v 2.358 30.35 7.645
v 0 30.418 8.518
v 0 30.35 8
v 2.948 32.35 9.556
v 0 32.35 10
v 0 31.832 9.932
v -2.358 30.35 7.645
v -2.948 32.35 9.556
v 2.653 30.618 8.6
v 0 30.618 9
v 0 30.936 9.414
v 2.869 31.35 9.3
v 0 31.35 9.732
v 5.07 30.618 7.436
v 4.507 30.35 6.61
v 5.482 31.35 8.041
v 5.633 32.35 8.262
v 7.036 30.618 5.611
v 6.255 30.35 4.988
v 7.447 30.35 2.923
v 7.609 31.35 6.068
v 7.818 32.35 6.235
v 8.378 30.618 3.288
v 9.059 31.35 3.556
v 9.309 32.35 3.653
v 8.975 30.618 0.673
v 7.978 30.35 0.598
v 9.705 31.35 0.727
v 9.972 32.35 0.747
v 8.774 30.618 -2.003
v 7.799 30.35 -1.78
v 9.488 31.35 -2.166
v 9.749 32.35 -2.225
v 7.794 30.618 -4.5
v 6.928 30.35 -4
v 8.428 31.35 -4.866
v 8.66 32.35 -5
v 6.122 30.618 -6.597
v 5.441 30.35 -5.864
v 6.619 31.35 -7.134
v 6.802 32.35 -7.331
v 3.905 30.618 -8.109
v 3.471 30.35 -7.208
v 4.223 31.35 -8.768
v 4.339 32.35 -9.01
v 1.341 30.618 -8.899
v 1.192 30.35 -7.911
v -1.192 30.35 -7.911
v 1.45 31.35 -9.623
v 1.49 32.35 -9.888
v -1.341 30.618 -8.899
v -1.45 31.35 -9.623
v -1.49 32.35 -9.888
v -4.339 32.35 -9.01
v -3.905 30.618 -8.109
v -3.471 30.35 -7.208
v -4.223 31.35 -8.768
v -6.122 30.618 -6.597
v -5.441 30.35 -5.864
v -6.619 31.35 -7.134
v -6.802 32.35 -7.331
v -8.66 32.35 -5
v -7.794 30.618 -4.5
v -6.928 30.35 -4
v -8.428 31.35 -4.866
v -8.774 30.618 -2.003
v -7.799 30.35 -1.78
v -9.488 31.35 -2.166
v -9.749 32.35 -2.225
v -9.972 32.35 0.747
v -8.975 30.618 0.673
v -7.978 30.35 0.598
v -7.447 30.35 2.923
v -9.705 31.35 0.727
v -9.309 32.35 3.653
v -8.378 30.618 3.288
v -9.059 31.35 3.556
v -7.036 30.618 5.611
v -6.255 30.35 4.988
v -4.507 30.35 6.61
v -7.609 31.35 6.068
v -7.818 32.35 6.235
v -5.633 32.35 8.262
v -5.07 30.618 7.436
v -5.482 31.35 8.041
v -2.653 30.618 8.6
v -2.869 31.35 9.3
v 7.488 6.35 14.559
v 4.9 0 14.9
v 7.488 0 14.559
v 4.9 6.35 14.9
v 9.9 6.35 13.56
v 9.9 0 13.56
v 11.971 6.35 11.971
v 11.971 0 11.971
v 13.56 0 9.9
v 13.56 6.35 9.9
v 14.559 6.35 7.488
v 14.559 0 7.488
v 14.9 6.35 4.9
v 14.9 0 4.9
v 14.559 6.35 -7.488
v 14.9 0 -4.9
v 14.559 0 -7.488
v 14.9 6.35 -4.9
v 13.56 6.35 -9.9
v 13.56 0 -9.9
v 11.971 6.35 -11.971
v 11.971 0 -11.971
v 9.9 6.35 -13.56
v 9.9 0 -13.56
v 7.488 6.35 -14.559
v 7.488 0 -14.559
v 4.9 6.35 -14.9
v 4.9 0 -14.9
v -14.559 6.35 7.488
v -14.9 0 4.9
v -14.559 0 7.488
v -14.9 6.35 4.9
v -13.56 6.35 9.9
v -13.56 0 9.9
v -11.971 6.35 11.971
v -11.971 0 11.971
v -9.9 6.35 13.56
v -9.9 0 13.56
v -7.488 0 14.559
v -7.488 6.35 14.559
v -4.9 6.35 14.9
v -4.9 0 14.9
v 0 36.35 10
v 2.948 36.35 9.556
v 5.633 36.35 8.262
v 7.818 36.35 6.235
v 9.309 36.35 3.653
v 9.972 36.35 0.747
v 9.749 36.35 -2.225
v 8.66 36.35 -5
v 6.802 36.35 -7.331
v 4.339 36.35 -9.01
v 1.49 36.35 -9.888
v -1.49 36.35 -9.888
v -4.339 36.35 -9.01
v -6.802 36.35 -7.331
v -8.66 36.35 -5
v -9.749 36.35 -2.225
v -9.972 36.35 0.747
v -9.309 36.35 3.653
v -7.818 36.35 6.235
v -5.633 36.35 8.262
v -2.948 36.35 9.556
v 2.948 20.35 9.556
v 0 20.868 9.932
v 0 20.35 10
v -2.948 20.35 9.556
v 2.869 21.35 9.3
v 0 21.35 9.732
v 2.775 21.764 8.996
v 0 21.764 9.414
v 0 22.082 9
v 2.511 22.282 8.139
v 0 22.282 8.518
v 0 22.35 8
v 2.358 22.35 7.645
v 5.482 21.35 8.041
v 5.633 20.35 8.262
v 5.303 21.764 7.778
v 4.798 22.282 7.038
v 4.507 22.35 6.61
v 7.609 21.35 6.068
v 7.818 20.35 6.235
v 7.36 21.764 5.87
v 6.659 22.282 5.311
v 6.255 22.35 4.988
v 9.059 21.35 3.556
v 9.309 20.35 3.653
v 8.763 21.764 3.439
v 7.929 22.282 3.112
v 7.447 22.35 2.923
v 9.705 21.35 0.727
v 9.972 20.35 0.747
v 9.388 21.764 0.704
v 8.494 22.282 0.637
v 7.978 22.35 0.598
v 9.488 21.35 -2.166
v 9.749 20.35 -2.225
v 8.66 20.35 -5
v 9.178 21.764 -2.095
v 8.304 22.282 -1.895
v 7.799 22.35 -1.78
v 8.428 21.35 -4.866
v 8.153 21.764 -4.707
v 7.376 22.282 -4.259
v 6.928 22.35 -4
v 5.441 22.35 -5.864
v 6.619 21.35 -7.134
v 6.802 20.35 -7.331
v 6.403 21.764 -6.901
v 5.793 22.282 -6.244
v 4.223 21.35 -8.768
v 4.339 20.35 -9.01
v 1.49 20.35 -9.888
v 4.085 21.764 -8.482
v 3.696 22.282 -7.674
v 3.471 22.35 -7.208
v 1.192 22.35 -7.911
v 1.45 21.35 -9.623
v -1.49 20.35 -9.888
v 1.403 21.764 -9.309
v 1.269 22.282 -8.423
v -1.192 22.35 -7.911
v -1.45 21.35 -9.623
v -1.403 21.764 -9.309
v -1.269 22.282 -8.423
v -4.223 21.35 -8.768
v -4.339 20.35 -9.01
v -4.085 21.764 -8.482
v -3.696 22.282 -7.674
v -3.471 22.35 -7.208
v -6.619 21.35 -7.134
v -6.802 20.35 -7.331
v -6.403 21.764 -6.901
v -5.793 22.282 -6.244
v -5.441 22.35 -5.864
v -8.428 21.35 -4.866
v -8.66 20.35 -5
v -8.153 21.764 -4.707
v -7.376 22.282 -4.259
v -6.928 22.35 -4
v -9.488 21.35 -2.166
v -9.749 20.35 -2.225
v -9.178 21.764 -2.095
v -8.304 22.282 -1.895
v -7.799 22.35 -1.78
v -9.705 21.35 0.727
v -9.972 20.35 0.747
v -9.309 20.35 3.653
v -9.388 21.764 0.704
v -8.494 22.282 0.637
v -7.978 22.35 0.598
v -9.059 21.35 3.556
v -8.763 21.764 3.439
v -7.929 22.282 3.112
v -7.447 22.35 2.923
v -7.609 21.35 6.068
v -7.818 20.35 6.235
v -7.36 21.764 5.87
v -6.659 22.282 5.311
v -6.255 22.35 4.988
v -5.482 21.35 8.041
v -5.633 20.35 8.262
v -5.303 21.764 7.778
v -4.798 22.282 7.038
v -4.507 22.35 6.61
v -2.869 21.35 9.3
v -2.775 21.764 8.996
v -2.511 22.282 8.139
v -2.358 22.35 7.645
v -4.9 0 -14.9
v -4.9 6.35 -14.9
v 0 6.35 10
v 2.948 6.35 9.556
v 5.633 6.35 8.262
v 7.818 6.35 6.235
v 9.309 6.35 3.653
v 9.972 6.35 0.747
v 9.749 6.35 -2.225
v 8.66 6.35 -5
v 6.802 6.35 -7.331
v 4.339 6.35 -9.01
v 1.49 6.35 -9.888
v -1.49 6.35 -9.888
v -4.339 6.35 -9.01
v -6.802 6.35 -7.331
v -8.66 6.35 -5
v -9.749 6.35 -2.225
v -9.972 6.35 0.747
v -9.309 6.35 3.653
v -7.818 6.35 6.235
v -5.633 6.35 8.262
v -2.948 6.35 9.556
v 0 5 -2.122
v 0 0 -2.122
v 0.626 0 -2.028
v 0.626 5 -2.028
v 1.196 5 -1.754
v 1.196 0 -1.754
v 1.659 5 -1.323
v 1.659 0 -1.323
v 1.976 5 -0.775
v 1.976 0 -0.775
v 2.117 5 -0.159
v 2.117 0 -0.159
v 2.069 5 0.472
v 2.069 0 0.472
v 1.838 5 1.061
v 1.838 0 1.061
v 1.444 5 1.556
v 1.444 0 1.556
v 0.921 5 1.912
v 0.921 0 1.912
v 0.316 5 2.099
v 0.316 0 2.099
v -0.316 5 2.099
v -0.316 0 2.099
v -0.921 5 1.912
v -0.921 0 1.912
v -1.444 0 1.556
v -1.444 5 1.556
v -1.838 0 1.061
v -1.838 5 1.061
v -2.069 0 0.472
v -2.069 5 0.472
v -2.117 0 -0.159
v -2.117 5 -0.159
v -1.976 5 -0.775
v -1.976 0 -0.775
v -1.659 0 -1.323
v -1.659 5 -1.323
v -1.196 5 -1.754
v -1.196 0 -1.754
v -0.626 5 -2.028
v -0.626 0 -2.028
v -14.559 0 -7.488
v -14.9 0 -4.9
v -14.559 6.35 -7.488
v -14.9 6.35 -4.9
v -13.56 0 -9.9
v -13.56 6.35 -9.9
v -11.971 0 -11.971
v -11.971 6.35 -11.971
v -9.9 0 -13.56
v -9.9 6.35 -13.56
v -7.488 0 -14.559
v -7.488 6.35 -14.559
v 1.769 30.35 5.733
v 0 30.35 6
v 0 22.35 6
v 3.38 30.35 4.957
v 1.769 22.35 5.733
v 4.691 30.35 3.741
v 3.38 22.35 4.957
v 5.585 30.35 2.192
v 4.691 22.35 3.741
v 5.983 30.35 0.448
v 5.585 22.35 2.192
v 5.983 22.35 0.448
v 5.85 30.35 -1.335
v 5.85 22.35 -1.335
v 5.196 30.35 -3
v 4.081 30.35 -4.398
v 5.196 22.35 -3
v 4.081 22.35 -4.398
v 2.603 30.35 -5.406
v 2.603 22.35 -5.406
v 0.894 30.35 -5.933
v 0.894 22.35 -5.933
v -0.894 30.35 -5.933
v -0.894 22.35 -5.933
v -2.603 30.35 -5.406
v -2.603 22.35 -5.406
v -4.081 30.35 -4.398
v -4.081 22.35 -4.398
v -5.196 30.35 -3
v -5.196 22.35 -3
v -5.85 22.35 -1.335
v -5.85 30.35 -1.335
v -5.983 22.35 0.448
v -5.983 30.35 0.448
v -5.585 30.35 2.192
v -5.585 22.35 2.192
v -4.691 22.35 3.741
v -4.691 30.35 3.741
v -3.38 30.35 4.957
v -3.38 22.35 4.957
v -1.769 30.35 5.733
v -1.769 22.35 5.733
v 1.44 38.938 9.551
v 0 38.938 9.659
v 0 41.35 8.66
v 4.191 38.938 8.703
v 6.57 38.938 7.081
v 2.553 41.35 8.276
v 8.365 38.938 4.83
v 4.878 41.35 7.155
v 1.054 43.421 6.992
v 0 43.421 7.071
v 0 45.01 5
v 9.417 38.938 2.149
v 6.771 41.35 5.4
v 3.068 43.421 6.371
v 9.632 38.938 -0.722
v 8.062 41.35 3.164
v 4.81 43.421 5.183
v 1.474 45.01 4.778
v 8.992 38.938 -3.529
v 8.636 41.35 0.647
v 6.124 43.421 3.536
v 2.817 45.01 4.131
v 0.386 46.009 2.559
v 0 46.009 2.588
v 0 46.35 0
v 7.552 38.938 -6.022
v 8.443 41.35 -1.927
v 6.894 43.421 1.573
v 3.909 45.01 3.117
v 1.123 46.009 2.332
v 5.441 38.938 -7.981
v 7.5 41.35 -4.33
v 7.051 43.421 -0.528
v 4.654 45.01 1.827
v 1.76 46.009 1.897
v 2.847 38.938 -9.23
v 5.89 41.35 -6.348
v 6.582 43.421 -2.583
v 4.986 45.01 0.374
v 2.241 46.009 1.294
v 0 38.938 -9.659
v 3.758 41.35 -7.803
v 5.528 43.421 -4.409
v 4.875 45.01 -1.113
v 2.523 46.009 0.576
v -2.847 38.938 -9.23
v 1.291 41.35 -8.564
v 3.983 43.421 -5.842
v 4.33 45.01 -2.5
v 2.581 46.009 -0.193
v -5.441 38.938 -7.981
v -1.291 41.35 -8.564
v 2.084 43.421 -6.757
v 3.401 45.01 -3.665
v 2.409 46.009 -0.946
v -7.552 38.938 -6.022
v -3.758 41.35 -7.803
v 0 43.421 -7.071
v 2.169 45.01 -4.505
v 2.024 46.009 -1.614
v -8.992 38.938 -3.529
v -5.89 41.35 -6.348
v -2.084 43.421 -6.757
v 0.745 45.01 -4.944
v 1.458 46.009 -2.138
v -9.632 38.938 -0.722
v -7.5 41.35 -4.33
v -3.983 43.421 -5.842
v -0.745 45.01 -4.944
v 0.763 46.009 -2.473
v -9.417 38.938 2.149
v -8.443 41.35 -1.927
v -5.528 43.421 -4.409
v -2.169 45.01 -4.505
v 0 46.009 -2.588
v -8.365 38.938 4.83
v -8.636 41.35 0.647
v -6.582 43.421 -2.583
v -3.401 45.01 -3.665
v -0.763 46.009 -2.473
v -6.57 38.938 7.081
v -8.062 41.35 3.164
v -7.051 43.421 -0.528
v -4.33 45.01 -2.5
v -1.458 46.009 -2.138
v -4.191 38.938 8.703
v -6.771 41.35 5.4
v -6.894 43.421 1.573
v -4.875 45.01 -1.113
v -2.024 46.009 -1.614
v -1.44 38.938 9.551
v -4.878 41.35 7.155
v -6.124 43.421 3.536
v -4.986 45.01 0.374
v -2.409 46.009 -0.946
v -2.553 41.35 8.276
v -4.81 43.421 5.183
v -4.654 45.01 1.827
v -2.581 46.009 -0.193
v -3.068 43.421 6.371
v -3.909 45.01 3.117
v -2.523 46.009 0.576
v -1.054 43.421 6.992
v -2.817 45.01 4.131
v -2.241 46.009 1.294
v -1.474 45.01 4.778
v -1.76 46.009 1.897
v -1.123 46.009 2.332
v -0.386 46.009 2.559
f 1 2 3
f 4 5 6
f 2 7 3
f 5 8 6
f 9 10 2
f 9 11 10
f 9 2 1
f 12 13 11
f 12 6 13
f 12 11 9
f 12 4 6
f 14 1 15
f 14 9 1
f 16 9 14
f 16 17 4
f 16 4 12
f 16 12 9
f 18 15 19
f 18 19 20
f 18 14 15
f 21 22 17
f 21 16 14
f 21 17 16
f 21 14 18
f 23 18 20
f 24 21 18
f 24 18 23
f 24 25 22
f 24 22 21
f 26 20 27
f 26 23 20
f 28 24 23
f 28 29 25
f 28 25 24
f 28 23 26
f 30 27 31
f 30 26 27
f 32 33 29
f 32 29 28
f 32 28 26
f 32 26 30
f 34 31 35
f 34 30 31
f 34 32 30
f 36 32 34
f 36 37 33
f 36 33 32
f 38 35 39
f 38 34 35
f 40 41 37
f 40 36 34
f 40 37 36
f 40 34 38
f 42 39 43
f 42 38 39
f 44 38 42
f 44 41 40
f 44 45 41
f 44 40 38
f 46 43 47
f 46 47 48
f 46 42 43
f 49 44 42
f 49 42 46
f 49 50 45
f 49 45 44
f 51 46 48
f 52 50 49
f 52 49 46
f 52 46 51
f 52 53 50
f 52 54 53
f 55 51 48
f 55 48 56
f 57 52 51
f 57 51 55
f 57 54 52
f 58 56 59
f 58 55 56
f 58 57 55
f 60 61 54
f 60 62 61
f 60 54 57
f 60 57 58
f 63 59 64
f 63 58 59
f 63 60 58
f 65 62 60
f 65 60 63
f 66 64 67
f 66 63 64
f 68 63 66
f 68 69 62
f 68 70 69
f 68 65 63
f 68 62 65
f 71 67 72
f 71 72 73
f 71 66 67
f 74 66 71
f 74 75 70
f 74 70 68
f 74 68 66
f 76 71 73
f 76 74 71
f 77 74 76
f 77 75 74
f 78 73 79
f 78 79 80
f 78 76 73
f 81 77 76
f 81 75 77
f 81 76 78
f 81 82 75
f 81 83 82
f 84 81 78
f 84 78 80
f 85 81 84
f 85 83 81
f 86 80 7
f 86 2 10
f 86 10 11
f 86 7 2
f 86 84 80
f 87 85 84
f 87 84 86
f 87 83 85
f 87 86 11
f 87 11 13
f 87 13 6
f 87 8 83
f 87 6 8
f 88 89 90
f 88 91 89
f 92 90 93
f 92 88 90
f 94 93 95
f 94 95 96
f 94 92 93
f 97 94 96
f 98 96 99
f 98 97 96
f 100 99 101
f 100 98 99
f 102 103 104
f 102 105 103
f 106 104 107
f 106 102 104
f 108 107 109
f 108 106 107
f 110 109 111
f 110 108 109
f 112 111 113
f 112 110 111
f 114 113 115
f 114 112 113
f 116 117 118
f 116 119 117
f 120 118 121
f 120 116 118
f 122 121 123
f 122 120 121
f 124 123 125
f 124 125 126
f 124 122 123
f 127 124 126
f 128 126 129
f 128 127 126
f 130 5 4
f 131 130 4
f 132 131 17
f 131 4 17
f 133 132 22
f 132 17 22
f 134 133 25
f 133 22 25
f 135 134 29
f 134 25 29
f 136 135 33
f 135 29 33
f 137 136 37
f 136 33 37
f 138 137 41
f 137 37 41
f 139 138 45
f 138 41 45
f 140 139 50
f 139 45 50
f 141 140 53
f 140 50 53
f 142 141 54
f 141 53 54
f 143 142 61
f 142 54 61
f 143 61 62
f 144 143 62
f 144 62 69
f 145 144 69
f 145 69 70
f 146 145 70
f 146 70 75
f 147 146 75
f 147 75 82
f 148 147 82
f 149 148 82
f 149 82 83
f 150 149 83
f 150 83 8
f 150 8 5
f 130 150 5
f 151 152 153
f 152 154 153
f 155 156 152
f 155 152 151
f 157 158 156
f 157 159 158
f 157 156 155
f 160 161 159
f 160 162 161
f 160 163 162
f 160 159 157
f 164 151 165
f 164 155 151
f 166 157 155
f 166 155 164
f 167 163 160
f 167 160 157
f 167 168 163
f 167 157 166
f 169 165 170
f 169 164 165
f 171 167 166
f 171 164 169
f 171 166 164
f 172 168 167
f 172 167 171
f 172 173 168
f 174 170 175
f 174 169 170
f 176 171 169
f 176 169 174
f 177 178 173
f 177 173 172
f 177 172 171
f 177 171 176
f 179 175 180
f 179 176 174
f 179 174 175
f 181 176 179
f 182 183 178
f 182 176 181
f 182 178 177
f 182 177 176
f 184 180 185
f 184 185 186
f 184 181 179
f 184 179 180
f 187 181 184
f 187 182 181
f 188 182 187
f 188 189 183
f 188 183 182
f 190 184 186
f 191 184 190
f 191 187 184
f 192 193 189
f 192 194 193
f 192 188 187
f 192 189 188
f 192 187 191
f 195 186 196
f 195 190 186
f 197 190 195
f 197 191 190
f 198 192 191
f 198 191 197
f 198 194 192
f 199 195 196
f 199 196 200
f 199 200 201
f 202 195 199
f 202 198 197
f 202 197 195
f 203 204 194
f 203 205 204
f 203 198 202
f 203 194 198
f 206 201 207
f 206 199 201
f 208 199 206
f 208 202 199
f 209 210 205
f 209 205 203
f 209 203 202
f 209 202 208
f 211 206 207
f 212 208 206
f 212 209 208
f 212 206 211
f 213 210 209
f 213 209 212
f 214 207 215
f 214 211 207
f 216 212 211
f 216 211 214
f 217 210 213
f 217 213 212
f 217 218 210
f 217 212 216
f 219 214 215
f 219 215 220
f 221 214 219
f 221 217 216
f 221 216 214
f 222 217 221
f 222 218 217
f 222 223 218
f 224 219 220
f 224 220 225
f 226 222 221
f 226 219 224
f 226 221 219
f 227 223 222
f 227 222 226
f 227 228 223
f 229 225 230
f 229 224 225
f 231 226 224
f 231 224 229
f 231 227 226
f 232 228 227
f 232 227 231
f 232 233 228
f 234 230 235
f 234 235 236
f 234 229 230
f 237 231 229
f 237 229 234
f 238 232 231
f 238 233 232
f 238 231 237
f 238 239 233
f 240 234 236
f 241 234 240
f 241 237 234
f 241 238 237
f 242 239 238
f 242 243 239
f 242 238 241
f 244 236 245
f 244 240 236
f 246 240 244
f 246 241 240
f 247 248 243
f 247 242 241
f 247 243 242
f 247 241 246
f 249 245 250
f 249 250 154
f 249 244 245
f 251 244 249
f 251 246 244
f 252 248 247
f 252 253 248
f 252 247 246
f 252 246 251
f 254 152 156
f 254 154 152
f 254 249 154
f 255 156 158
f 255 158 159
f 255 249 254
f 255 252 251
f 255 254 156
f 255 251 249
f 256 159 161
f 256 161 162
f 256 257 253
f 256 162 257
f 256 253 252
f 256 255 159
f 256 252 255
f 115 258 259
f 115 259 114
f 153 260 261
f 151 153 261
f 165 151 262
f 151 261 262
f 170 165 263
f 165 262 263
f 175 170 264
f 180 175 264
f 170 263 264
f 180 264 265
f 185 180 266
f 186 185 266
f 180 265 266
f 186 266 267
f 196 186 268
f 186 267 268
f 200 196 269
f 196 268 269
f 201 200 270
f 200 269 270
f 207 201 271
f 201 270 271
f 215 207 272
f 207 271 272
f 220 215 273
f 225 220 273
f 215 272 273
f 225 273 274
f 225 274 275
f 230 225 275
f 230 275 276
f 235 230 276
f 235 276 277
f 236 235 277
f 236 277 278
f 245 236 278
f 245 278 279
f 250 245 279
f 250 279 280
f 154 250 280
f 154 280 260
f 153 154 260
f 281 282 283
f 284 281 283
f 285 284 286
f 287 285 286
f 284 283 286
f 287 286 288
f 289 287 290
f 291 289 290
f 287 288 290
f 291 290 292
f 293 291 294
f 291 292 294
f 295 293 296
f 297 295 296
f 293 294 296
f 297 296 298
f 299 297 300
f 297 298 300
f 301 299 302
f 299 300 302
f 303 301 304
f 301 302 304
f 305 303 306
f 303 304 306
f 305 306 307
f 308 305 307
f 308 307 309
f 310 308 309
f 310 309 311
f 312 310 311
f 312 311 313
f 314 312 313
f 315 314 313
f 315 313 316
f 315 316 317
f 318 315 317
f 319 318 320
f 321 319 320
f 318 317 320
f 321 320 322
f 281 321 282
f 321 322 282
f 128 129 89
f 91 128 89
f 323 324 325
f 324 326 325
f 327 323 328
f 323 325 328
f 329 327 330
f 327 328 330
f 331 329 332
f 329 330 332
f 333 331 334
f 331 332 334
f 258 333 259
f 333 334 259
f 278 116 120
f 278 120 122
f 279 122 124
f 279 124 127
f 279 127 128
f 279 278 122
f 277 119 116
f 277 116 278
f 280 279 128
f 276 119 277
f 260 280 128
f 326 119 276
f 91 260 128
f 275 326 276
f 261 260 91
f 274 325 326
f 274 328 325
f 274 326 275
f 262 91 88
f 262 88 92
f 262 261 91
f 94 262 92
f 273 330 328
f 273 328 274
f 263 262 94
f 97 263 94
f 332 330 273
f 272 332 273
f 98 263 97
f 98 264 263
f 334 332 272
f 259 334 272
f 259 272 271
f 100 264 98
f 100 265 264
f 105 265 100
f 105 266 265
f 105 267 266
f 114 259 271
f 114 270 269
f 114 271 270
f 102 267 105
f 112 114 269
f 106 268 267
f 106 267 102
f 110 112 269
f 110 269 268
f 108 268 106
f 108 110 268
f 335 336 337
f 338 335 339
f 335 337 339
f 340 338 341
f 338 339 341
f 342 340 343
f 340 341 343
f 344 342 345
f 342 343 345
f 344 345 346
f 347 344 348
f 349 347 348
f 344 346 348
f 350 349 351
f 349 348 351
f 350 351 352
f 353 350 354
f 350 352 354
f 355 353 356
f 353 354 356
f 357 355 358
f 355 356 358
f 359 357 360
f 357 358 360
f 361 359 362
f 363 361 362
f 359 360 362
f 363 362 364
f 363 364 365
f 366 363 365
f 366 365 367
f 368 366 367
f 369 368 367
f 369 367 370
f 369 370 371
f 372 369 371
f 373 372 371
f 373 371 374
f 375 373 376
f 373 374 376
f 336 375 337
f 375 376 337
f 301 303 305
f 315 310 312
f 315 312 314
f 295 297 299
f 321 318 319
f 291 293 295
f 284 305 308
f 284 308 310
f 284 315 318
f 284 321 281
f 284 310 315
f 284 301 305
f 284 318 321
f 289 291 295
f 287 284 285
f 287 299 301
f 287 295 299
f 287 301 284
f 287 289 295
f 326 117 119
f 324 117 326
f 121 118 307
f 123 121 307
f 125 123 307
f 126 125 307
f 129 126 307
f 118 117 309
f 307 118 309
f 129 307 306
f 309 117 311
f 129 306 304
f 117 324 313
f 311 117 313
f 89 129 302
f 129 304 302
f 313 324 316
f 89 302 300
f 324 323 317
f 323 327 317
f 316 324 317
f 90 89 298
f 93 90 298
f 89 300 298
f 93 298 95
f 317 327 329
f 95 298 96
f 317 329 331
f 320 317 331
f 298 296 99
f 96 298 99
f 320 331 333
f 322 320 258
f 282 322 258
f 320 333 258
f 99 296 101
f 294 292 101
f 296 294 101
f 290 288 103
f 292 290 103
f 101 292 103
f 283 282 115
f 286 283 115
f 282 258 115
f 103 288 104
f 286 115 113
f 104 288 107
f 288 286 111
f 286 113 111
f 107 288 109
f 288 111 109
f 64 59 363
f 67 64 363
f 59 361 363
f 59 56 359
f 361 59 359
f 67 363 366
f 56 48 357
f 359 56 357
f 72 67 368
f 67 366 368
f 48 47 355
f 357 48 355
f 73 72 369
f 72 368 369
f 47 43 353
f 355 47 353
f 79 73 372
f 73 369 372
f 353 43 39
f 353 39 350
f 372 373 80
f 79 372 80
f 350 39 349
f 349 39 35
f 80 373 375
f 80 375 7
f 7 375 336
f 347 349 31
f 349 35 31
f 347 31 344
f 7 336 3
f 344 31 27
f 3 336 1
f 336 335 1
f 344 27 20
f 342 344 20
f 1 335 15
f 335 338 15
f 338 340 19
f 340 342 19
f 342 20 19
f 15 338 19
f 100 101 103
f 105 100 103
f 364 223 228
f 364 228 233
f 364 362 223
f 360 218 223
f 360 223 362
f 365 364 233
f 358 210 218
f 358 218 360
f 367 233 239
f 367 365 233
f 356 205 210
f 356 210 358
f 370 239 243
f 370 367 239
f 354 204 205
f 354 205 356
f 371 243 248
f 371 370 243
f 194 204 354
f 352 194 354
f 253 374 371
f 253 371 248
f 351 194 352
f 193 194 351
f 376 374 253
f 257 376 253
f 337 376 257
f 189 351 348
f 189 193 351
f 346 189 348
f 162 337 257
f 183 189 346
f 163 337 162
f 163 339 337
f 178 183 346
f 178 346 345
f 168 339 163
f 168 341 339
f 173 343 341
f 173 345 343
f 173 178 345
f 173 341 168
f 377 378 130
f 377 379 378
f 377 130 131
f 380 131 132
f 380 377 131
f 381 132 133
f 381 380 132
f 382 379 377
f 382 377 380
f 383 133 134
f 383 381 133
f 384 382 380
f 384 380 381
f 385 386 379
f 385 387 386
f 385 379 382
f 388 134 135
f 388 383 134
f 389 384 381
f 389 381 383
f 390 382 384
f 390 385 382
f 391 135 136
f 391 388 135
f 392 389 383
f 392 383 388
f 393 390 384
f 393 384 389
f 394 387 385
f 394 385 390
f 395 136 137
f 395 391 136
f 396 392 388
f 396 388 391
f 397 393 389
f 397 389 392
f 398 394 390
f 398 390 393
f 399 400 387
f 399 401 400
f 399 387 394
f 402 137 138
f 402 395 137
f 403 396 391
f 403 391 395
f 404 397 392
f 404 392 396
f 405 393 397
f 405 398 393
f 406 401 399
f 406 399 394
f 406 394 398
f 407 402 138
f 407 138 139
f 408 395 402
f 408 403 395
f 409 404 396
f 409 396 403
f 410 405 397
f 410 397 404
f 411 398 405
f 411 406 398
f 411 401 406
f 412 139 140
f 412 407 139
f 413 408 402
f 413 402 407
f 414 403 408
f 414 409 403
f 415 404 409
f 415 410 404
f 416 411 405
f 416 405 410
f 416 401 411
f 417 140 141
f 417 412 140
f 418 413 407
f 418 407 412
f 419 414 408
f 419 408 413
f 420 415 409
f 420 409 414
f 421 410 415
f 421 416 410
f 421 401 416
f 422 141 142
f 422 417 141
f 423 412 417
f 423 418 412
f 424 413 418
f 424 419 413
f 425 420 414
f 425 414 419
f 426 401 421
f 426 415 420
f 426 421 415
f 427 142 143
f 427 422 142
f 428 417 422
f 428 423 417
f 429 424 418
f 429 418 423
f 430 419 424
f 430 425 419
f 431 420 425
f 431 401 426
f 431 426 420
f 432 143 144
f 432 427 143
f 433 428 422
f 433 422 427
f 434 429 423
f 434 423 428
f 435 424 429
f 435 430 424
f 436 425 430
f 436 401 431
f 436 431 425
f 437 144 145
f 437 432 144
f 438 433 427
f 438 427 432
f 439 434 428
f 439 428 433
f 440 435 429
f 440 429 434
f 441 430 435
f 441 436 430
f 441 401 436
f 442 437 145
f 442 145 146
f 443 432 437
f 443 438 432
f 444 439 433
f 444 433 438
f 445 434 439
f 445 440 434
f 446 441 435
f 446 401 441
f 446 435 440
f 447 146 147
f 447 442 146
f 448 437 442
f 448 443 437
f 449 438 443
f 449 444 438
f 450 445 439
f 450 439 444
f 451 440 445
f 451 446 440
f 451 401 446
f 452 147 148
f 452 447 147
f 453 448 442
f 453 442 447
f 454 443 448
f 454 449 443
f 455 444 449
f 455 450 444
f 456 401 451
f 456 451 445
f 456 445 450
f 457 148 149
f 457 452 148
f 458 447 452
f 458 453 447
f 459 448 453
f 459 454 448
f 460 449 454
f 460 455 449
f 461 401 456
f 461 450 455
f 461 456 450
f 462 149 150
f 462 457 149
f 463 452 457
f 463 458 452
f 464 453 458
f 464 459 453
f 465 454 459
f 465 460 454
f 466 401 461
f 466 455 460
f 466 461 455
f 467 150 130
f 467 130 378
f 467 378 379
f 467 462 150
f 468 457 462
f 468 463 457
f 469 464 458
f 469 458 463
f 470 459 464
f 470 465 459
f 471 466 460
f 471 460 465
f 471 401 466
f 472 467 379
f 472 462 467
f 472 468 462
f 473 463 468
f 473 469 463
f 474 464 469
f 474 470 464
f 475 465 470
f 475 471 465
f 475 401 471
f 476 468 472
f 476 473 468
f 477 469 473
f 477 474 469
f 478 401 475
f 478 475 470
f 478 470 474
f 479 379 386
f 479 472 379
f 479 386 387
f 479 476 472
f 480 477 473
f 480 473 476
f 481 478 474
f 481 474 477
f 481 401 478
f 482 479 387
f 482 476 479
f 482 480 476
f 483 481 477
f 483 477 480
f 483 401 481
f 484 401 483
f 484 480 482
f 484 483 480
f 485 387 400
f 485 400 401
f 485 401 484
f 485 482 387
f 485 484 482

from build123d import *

# Parameters (mm, degrees)
SKETCH2_W               = 29.8
SKETCH2_H               = 29.8
BOSS_EXTRUDE1_DEPTH     = 6.35
FILLET1_R               = 10
SKETCH9_R               = 10
BOSS_EXTRUDE6_DEPTH     = 40
FILLET5_R               = 10
CUT_EXTRUDE2_DEPTH      = 4
CUT_EXTRUDE2_DEPTH_BACK = 4
SKETCH11_R              = 10
SKETCH11_R_2            = 6
FILLET6_R               = 2
SKETCH12_R              = 2.1225
CUT_EXTRUDE3_DEPTH      = 5


with BuildPart() as part:
    # Sketch2 → Boss-Extrude1 (new body)
    with BuildSketch(Plane(origin=(0, 0, 0), x_dir=(1, 0, 0), z_dir=(0, 1, 0))):
        Rectangle(SKETCH2_W, SKETCH2_H)
    extrude(amount=BOSS_EXTRUDE1_DEPTH)

    # Fillet1
    fillet1_edges = [part.edges().sort_by_distance(p)[0] for p in [
        (14.9, 3.175, 14.9),
        (-14.9, 3.175, 14.9),
        (-14.9, 3.175, -14.9),
        (14.9, 3.175, -14.9),
    ]]
    fillet(fillet1_edges, radius=FILLET1_R)

    # Sketch9 → Boss-Extrude6 (add)
    with BuildSketch(Plane(origin=(0, 6.35, 0), x_dir=(1, 0, 0), z_dir=(0, 1, 0))):
        Circle(SKETCH9_R)
    extrude(amount=BOSS_EXTRUDE6_DEPTH)

    # Fillet5
    fillet5_edges = [part.edges().sort_by_distance(p)[0] for p in [
        (-10, 46.35, 0),
    ]]
    fillet(fillet5_edges, radius=FILLET5_R)

    # Sketch11 → Cut-Extrude2 (cut, two sides: drawn at the far end of the back side and taken through both)
    with BuildSketch(Plane(origin=(0, 26.35, 0), x_dir=(1, 0, 0), z_dir=(0, 1, 0)).offset(-CUT_EXTRUDE2_DEPTH_BACK)):
        Circle(SKETCH11_R)
        Circle(SKETCH11_R_2, mode=Mode.SUBTRACT)
    extrude(amount=CUT_EXTRUDE2_DEPTH + CUT_EXTRUDE2_DEPTH_BACK, mode=Mode.SUBTRACT)

    # Fillet6
    fillet6_edges = [part.edges().sort_by_distance(p)[0] for p in [
        (-10, 30.35, 0),
        (-10, 22.35, 0),
    ]]
    fillet(fillet6_edges, radius=FILLET6_R)

    # Sketch12 → Cut-Extrude3 (cut)
    with BuildSketch(Plane.XZ):
        Circle(SKETCH12_R)
    extrude(amount=-CUT_EXTRUDE3_DEPTH, mode=Mode.SUBTRACT)


solid = part.part
